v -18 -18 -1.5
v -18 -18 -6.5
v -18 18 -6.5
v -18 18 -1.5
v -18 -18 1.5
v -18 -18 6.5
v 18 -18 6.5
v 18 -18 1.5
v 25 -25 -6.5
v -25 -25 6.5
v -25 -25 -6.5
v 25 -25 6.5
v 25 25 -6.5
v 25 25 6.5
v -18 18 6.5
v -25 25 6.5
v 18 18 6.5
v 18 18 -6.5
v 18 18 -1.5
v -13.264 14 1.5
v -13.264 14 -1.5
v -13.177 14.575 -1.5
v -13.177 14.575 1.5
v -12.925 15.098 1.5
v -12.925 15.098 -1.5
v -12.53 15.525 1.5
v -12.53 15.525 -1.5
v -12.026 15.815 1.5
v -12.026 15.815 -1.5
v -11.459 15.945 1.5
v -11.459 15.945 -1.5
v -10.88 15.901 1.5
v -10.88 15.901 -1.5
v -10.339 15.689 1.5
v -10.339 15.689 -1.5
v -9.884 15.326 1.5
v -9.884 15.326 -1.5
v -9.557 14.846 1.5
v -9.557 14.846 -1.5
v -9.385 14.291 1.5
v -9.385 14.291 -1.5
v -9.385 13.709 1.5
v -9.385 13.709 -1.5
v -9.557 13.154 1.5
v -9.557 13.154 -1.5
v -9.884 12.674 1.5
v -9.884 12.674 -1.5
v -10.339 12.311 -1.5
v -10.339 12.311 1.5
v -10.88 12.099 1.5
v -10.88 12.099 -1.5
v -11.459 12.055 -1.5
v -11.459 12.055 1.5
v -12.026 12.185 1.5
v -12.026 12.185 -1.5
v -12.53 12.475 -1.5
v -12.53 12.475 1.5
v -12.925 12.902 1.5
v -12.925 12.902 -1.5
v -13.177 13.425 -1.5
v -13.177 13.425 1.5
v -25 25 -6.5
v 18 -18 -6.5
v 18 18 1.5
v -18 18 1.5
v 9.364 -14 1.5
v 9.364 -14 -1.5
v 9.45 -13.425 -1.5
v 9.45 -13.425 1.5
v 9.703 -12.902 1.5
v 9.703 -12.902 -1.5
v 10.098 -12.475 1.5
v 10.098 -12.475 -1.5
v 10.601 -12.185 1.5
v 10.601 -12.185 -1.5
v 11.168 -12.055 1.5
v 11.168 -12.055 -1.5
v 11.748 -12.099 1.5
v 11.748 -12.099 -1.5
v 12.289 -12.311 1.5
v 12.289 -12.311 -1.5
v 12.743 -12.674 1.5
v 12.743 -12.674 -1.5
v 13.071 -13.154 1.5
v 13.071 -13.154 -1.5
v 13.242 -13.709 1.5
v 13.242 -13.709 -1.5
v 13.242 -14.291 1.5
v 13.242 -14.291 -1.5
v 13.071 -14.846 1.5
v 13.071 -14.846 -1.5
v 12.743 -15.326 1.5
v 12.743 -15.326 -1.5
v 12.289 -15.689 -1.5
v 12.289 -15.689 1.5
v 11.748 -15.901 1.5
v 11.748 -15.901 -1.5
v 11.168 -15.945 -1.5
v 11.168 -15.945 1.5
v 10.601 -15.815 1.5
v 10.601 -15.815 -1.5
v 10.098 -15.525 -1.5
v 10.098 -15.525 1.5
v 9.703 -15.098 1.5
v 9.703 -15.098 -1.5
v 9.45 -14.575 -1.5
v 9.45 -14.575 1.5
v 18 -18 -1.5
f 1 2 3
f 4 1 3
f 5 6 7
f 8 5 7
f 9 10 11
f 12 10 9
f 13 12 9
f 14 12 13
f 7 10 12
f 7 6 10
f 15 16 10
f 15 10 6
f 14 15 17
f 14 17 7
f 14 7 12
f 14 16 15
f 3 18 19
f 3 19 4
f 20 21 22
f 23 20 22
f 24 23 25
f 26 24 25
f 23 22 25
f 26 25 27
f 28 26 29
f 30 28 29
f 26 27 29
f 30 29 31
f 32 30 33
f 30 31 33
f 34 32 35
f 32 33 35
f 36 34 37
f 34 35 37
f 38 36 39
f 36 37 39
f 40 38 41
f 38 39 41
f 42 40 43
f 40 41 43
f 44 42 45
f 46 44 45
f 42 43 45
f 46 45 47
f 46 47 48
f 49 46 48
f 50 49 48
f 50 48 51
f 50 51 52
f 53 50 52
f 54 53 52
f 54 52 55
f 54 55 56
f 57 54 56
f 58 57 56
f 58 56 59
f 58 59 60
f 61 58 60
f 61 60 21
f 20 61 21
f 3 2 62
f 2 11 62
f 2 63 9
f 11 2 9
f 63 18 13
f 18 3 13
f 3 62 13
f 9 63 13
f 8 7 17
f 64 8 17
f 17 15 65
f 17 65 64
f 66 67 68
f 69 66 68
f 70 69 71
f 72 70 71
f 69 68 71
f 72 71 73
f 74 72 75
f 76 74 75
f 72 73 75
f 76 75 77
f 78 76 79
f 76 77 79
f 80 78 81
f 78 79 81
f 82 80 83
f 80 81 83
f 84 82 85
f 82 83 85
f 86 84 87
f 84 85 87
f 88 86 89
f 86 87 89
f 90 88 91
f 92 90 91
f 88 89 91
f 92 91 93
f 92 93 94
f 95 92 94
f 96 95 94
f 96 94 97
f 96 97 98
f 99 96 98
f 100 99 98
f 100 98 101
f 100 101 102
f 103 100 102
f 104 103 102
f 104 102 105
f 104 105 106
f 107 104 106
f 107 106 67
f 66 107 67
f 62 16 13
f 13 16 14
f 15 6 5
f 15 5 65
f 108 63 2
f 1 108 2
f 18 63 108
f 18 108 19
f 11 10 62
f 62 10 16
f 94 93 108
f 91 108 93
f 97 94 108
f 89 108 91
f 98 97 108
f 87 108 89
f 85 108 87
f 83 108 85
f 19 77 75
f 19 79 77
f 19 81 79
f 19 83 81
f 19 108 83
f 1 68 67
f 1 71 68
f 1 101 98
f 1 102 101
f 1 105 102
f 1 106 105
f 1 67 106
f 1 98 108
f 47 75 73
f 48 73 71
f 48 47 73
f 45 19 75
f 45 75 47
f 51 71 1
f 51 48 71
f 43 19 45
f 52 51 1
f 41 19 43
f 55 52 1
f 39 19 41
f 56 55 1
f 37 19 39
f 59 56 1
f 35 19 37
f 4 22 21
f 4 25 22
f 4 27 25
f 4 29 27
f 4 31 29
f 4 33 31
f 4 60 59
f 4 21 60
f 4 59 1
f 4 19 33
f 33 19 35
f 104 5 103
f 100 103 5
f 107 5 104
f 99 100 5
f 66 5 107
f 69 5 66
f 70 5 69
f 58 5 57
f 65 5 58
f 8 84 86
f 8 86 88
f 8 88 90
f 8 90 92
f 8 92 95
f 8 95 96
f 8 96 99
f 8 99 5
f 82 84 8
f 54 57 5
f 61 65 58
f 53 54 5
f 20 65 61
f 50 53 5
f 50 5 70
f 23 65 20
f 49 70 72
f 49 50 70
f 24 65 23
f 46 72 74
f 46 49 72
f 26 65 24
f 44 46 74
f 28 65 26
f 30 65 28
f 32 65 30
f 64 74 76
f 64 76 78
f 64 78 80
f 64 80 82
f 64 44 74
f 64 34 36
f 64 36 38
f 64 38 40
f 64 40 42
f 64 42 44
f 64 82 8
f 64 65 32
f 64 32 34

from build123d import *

# Parameters (mm, degrees)
BOSS_EXTRU_1_DEPTH      = 6.5
BOSS_EXTRU_1_DEPTH_BACK = 6.5
ESQUISSE1_W             = 50
ESQUISSE1_H             = 50
ESQUISSE2_W             = 36
ESQUISSE2_H             = 36
ENL_V_MAT_EXTRU_1_DEPTH = 5
ESQUISSE3_W             = 36
ESQUISSE3_H             = 36
ENL_V_MAT_EXTRU_2_DEPTH = 5
D_GAGEMENT_M3_51_D      = 3.9


with BuildPart() as part:
    # Esquisse1 → Boss.-Extru.1 (new, two sides: drawn at the far end of the back side and taken through both)
    with BuildSketch(Plane.XY.offset(-BOSS_EXTRU_1_DEPTH_BACK)):
        Rectangle(ESQUISSE1_W, ESQUISSE1_H)
    extrude(amount=BOSS_EXTRU_1_DEPTH + BOSS_EXTRU_1_DEPTH_BACK)

    # Esquisse2 → Enlèv. mat.-Extru.1 (cut)
    with BuildSketch(Plane.XY.offset(6.5)):
        Rectangle(ESQUISSE2_W, ESQUISSE2_H)
    extrude(amount=-ENL_V_MAT_EXTRU_1_DEPTH, mode=Mode.SUBTRACT)

    # Esquisse3 → Enlèv. mat.-Extru.2 (cut)
    with BuildSketch(Plane(origin=(0, 0, -6.5), x_dir=(-1, 0, 0), z_dir=(0, 0, -1))):
        Rectangle(ESQUISSE3_W, ESQUISSE3_H)
    extrude(amount=-ENL_V_MAT_EXTRU_2_DEPTH, mode=Mode.SUBTRACT)

    # Dégagement M3.51 (through all)
    with Locations(Plane.XY.offset(1.5)):
        with Locations((-11.313708499, 14), (11.313708499, -14)):
            Hole(D_GAGEMENT_M3_51_D / 2)


solid = part.part
